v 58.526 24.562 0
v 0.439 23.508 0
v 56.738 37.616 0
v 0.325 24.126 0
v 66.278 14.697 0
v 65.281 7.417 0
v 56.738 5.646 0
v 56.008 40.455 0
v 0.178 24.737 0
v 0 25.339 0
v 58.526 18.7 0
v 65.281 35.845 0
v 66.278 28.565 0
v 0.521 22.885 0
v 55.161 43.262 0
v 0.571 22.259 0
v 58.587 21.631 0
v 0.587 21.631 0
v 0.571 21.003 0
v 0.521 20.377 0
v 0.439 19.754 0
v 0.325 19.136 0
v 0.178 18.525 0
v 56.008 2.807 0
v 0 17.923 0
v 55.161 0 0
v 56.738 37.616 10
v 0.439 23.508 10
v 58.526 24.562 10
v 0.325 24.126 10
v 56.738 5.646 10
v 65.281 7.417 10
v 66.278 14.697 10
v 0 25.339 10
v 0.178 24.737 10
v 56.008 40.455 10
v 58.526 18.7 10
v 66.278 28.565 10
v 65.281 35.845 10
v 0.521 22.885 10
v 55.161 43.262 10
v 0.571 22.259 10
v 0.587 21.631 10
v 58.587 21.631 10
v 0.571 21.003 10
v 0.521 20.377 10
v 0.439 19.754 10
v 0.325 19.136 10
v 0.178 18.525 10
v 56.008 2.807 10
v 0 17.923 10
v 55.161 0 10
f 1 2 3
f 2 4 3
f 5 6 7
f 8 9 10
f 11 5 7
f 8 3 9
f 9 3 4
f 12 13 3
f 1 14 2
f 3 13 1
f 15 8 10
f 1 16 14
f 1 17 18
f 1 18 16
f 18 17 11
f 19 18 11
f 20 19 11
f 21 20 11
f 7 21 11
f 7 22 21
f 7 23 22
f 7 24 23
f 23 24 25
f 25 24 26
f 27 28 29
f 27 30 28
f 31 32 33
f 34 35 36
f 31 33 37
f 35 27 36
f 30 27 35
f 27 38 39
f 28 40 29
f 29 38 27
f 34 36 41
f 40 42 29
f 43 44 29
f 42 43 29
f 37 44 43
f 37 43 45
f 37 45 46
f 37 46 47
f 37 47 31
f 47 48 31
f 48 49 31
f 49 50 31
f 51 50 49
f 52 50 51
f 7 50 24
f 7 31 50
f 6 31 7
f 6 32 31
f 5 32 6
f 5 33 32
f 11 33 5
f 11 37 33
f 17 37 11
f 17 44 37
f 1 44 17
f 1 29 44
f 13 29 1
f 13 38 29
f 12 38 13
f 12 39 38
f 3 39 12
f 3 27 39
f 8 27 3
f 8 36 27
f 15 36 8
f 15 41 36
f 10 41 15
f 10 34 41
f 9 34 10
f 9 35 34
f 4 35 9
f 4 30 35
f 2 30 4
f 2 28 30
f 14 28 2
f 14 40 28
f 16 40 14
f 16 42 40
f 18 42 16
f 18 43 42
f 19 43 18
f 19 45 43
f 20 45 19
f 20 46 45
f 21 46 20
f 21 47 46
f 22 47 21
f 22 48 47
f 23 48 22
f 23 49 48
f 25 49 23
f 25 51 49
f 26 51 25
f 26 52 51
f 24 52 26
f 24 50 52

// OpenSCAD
$fn = 32;

// ----------------------------------------------------------------------
// Gear sector: 2 teeth on 36 degrees
// ----------------------------------------------------------------------

// --- parameters (mm) ---
sector_angle = 36;        // sector angle, degrees
root_r = 70;              // root circle radius
tooth_h = 8;              // tooth height over the root circle
teeth = 2;                // number of teeth on the sector
hub_r = 12;               // hub bore radius
plate_t = 10;             // sector thickness, Z
arc_step = 3;             // sampling step of the root/hub arcs, degrees

tip_r = root_r + tooth_h;  // tip circle radius

profile = [[55.161, 0], [56.008, 2.807], [56.738, 5.646], [65.281, 7.417], [66.278, 14.697], [58.526, 18.7], [58.587, 21.631], [58.526, 24.562], [66.278, 28.565], [65.281, 35.845], [56.738, 37.616], [56.008, 40.455], [55.161, 43.262], [0, 25.339], [0.178, 24.737], [0.325, 24.126], [0.439, 23.508], [0.521, 22.885], [0.571, 22.259], [0.587, 21.631], [0.571, 21.003], [0.521, 20.377], [0.439, 19.754], [0.325, 19.136], [0.178, 18.525], [0, 17.923]];  // primary outline, 26 points, counter clockwise

// --- the one profile operation ---
linear_extrude(height = plate_t) polygon(points = profile);
